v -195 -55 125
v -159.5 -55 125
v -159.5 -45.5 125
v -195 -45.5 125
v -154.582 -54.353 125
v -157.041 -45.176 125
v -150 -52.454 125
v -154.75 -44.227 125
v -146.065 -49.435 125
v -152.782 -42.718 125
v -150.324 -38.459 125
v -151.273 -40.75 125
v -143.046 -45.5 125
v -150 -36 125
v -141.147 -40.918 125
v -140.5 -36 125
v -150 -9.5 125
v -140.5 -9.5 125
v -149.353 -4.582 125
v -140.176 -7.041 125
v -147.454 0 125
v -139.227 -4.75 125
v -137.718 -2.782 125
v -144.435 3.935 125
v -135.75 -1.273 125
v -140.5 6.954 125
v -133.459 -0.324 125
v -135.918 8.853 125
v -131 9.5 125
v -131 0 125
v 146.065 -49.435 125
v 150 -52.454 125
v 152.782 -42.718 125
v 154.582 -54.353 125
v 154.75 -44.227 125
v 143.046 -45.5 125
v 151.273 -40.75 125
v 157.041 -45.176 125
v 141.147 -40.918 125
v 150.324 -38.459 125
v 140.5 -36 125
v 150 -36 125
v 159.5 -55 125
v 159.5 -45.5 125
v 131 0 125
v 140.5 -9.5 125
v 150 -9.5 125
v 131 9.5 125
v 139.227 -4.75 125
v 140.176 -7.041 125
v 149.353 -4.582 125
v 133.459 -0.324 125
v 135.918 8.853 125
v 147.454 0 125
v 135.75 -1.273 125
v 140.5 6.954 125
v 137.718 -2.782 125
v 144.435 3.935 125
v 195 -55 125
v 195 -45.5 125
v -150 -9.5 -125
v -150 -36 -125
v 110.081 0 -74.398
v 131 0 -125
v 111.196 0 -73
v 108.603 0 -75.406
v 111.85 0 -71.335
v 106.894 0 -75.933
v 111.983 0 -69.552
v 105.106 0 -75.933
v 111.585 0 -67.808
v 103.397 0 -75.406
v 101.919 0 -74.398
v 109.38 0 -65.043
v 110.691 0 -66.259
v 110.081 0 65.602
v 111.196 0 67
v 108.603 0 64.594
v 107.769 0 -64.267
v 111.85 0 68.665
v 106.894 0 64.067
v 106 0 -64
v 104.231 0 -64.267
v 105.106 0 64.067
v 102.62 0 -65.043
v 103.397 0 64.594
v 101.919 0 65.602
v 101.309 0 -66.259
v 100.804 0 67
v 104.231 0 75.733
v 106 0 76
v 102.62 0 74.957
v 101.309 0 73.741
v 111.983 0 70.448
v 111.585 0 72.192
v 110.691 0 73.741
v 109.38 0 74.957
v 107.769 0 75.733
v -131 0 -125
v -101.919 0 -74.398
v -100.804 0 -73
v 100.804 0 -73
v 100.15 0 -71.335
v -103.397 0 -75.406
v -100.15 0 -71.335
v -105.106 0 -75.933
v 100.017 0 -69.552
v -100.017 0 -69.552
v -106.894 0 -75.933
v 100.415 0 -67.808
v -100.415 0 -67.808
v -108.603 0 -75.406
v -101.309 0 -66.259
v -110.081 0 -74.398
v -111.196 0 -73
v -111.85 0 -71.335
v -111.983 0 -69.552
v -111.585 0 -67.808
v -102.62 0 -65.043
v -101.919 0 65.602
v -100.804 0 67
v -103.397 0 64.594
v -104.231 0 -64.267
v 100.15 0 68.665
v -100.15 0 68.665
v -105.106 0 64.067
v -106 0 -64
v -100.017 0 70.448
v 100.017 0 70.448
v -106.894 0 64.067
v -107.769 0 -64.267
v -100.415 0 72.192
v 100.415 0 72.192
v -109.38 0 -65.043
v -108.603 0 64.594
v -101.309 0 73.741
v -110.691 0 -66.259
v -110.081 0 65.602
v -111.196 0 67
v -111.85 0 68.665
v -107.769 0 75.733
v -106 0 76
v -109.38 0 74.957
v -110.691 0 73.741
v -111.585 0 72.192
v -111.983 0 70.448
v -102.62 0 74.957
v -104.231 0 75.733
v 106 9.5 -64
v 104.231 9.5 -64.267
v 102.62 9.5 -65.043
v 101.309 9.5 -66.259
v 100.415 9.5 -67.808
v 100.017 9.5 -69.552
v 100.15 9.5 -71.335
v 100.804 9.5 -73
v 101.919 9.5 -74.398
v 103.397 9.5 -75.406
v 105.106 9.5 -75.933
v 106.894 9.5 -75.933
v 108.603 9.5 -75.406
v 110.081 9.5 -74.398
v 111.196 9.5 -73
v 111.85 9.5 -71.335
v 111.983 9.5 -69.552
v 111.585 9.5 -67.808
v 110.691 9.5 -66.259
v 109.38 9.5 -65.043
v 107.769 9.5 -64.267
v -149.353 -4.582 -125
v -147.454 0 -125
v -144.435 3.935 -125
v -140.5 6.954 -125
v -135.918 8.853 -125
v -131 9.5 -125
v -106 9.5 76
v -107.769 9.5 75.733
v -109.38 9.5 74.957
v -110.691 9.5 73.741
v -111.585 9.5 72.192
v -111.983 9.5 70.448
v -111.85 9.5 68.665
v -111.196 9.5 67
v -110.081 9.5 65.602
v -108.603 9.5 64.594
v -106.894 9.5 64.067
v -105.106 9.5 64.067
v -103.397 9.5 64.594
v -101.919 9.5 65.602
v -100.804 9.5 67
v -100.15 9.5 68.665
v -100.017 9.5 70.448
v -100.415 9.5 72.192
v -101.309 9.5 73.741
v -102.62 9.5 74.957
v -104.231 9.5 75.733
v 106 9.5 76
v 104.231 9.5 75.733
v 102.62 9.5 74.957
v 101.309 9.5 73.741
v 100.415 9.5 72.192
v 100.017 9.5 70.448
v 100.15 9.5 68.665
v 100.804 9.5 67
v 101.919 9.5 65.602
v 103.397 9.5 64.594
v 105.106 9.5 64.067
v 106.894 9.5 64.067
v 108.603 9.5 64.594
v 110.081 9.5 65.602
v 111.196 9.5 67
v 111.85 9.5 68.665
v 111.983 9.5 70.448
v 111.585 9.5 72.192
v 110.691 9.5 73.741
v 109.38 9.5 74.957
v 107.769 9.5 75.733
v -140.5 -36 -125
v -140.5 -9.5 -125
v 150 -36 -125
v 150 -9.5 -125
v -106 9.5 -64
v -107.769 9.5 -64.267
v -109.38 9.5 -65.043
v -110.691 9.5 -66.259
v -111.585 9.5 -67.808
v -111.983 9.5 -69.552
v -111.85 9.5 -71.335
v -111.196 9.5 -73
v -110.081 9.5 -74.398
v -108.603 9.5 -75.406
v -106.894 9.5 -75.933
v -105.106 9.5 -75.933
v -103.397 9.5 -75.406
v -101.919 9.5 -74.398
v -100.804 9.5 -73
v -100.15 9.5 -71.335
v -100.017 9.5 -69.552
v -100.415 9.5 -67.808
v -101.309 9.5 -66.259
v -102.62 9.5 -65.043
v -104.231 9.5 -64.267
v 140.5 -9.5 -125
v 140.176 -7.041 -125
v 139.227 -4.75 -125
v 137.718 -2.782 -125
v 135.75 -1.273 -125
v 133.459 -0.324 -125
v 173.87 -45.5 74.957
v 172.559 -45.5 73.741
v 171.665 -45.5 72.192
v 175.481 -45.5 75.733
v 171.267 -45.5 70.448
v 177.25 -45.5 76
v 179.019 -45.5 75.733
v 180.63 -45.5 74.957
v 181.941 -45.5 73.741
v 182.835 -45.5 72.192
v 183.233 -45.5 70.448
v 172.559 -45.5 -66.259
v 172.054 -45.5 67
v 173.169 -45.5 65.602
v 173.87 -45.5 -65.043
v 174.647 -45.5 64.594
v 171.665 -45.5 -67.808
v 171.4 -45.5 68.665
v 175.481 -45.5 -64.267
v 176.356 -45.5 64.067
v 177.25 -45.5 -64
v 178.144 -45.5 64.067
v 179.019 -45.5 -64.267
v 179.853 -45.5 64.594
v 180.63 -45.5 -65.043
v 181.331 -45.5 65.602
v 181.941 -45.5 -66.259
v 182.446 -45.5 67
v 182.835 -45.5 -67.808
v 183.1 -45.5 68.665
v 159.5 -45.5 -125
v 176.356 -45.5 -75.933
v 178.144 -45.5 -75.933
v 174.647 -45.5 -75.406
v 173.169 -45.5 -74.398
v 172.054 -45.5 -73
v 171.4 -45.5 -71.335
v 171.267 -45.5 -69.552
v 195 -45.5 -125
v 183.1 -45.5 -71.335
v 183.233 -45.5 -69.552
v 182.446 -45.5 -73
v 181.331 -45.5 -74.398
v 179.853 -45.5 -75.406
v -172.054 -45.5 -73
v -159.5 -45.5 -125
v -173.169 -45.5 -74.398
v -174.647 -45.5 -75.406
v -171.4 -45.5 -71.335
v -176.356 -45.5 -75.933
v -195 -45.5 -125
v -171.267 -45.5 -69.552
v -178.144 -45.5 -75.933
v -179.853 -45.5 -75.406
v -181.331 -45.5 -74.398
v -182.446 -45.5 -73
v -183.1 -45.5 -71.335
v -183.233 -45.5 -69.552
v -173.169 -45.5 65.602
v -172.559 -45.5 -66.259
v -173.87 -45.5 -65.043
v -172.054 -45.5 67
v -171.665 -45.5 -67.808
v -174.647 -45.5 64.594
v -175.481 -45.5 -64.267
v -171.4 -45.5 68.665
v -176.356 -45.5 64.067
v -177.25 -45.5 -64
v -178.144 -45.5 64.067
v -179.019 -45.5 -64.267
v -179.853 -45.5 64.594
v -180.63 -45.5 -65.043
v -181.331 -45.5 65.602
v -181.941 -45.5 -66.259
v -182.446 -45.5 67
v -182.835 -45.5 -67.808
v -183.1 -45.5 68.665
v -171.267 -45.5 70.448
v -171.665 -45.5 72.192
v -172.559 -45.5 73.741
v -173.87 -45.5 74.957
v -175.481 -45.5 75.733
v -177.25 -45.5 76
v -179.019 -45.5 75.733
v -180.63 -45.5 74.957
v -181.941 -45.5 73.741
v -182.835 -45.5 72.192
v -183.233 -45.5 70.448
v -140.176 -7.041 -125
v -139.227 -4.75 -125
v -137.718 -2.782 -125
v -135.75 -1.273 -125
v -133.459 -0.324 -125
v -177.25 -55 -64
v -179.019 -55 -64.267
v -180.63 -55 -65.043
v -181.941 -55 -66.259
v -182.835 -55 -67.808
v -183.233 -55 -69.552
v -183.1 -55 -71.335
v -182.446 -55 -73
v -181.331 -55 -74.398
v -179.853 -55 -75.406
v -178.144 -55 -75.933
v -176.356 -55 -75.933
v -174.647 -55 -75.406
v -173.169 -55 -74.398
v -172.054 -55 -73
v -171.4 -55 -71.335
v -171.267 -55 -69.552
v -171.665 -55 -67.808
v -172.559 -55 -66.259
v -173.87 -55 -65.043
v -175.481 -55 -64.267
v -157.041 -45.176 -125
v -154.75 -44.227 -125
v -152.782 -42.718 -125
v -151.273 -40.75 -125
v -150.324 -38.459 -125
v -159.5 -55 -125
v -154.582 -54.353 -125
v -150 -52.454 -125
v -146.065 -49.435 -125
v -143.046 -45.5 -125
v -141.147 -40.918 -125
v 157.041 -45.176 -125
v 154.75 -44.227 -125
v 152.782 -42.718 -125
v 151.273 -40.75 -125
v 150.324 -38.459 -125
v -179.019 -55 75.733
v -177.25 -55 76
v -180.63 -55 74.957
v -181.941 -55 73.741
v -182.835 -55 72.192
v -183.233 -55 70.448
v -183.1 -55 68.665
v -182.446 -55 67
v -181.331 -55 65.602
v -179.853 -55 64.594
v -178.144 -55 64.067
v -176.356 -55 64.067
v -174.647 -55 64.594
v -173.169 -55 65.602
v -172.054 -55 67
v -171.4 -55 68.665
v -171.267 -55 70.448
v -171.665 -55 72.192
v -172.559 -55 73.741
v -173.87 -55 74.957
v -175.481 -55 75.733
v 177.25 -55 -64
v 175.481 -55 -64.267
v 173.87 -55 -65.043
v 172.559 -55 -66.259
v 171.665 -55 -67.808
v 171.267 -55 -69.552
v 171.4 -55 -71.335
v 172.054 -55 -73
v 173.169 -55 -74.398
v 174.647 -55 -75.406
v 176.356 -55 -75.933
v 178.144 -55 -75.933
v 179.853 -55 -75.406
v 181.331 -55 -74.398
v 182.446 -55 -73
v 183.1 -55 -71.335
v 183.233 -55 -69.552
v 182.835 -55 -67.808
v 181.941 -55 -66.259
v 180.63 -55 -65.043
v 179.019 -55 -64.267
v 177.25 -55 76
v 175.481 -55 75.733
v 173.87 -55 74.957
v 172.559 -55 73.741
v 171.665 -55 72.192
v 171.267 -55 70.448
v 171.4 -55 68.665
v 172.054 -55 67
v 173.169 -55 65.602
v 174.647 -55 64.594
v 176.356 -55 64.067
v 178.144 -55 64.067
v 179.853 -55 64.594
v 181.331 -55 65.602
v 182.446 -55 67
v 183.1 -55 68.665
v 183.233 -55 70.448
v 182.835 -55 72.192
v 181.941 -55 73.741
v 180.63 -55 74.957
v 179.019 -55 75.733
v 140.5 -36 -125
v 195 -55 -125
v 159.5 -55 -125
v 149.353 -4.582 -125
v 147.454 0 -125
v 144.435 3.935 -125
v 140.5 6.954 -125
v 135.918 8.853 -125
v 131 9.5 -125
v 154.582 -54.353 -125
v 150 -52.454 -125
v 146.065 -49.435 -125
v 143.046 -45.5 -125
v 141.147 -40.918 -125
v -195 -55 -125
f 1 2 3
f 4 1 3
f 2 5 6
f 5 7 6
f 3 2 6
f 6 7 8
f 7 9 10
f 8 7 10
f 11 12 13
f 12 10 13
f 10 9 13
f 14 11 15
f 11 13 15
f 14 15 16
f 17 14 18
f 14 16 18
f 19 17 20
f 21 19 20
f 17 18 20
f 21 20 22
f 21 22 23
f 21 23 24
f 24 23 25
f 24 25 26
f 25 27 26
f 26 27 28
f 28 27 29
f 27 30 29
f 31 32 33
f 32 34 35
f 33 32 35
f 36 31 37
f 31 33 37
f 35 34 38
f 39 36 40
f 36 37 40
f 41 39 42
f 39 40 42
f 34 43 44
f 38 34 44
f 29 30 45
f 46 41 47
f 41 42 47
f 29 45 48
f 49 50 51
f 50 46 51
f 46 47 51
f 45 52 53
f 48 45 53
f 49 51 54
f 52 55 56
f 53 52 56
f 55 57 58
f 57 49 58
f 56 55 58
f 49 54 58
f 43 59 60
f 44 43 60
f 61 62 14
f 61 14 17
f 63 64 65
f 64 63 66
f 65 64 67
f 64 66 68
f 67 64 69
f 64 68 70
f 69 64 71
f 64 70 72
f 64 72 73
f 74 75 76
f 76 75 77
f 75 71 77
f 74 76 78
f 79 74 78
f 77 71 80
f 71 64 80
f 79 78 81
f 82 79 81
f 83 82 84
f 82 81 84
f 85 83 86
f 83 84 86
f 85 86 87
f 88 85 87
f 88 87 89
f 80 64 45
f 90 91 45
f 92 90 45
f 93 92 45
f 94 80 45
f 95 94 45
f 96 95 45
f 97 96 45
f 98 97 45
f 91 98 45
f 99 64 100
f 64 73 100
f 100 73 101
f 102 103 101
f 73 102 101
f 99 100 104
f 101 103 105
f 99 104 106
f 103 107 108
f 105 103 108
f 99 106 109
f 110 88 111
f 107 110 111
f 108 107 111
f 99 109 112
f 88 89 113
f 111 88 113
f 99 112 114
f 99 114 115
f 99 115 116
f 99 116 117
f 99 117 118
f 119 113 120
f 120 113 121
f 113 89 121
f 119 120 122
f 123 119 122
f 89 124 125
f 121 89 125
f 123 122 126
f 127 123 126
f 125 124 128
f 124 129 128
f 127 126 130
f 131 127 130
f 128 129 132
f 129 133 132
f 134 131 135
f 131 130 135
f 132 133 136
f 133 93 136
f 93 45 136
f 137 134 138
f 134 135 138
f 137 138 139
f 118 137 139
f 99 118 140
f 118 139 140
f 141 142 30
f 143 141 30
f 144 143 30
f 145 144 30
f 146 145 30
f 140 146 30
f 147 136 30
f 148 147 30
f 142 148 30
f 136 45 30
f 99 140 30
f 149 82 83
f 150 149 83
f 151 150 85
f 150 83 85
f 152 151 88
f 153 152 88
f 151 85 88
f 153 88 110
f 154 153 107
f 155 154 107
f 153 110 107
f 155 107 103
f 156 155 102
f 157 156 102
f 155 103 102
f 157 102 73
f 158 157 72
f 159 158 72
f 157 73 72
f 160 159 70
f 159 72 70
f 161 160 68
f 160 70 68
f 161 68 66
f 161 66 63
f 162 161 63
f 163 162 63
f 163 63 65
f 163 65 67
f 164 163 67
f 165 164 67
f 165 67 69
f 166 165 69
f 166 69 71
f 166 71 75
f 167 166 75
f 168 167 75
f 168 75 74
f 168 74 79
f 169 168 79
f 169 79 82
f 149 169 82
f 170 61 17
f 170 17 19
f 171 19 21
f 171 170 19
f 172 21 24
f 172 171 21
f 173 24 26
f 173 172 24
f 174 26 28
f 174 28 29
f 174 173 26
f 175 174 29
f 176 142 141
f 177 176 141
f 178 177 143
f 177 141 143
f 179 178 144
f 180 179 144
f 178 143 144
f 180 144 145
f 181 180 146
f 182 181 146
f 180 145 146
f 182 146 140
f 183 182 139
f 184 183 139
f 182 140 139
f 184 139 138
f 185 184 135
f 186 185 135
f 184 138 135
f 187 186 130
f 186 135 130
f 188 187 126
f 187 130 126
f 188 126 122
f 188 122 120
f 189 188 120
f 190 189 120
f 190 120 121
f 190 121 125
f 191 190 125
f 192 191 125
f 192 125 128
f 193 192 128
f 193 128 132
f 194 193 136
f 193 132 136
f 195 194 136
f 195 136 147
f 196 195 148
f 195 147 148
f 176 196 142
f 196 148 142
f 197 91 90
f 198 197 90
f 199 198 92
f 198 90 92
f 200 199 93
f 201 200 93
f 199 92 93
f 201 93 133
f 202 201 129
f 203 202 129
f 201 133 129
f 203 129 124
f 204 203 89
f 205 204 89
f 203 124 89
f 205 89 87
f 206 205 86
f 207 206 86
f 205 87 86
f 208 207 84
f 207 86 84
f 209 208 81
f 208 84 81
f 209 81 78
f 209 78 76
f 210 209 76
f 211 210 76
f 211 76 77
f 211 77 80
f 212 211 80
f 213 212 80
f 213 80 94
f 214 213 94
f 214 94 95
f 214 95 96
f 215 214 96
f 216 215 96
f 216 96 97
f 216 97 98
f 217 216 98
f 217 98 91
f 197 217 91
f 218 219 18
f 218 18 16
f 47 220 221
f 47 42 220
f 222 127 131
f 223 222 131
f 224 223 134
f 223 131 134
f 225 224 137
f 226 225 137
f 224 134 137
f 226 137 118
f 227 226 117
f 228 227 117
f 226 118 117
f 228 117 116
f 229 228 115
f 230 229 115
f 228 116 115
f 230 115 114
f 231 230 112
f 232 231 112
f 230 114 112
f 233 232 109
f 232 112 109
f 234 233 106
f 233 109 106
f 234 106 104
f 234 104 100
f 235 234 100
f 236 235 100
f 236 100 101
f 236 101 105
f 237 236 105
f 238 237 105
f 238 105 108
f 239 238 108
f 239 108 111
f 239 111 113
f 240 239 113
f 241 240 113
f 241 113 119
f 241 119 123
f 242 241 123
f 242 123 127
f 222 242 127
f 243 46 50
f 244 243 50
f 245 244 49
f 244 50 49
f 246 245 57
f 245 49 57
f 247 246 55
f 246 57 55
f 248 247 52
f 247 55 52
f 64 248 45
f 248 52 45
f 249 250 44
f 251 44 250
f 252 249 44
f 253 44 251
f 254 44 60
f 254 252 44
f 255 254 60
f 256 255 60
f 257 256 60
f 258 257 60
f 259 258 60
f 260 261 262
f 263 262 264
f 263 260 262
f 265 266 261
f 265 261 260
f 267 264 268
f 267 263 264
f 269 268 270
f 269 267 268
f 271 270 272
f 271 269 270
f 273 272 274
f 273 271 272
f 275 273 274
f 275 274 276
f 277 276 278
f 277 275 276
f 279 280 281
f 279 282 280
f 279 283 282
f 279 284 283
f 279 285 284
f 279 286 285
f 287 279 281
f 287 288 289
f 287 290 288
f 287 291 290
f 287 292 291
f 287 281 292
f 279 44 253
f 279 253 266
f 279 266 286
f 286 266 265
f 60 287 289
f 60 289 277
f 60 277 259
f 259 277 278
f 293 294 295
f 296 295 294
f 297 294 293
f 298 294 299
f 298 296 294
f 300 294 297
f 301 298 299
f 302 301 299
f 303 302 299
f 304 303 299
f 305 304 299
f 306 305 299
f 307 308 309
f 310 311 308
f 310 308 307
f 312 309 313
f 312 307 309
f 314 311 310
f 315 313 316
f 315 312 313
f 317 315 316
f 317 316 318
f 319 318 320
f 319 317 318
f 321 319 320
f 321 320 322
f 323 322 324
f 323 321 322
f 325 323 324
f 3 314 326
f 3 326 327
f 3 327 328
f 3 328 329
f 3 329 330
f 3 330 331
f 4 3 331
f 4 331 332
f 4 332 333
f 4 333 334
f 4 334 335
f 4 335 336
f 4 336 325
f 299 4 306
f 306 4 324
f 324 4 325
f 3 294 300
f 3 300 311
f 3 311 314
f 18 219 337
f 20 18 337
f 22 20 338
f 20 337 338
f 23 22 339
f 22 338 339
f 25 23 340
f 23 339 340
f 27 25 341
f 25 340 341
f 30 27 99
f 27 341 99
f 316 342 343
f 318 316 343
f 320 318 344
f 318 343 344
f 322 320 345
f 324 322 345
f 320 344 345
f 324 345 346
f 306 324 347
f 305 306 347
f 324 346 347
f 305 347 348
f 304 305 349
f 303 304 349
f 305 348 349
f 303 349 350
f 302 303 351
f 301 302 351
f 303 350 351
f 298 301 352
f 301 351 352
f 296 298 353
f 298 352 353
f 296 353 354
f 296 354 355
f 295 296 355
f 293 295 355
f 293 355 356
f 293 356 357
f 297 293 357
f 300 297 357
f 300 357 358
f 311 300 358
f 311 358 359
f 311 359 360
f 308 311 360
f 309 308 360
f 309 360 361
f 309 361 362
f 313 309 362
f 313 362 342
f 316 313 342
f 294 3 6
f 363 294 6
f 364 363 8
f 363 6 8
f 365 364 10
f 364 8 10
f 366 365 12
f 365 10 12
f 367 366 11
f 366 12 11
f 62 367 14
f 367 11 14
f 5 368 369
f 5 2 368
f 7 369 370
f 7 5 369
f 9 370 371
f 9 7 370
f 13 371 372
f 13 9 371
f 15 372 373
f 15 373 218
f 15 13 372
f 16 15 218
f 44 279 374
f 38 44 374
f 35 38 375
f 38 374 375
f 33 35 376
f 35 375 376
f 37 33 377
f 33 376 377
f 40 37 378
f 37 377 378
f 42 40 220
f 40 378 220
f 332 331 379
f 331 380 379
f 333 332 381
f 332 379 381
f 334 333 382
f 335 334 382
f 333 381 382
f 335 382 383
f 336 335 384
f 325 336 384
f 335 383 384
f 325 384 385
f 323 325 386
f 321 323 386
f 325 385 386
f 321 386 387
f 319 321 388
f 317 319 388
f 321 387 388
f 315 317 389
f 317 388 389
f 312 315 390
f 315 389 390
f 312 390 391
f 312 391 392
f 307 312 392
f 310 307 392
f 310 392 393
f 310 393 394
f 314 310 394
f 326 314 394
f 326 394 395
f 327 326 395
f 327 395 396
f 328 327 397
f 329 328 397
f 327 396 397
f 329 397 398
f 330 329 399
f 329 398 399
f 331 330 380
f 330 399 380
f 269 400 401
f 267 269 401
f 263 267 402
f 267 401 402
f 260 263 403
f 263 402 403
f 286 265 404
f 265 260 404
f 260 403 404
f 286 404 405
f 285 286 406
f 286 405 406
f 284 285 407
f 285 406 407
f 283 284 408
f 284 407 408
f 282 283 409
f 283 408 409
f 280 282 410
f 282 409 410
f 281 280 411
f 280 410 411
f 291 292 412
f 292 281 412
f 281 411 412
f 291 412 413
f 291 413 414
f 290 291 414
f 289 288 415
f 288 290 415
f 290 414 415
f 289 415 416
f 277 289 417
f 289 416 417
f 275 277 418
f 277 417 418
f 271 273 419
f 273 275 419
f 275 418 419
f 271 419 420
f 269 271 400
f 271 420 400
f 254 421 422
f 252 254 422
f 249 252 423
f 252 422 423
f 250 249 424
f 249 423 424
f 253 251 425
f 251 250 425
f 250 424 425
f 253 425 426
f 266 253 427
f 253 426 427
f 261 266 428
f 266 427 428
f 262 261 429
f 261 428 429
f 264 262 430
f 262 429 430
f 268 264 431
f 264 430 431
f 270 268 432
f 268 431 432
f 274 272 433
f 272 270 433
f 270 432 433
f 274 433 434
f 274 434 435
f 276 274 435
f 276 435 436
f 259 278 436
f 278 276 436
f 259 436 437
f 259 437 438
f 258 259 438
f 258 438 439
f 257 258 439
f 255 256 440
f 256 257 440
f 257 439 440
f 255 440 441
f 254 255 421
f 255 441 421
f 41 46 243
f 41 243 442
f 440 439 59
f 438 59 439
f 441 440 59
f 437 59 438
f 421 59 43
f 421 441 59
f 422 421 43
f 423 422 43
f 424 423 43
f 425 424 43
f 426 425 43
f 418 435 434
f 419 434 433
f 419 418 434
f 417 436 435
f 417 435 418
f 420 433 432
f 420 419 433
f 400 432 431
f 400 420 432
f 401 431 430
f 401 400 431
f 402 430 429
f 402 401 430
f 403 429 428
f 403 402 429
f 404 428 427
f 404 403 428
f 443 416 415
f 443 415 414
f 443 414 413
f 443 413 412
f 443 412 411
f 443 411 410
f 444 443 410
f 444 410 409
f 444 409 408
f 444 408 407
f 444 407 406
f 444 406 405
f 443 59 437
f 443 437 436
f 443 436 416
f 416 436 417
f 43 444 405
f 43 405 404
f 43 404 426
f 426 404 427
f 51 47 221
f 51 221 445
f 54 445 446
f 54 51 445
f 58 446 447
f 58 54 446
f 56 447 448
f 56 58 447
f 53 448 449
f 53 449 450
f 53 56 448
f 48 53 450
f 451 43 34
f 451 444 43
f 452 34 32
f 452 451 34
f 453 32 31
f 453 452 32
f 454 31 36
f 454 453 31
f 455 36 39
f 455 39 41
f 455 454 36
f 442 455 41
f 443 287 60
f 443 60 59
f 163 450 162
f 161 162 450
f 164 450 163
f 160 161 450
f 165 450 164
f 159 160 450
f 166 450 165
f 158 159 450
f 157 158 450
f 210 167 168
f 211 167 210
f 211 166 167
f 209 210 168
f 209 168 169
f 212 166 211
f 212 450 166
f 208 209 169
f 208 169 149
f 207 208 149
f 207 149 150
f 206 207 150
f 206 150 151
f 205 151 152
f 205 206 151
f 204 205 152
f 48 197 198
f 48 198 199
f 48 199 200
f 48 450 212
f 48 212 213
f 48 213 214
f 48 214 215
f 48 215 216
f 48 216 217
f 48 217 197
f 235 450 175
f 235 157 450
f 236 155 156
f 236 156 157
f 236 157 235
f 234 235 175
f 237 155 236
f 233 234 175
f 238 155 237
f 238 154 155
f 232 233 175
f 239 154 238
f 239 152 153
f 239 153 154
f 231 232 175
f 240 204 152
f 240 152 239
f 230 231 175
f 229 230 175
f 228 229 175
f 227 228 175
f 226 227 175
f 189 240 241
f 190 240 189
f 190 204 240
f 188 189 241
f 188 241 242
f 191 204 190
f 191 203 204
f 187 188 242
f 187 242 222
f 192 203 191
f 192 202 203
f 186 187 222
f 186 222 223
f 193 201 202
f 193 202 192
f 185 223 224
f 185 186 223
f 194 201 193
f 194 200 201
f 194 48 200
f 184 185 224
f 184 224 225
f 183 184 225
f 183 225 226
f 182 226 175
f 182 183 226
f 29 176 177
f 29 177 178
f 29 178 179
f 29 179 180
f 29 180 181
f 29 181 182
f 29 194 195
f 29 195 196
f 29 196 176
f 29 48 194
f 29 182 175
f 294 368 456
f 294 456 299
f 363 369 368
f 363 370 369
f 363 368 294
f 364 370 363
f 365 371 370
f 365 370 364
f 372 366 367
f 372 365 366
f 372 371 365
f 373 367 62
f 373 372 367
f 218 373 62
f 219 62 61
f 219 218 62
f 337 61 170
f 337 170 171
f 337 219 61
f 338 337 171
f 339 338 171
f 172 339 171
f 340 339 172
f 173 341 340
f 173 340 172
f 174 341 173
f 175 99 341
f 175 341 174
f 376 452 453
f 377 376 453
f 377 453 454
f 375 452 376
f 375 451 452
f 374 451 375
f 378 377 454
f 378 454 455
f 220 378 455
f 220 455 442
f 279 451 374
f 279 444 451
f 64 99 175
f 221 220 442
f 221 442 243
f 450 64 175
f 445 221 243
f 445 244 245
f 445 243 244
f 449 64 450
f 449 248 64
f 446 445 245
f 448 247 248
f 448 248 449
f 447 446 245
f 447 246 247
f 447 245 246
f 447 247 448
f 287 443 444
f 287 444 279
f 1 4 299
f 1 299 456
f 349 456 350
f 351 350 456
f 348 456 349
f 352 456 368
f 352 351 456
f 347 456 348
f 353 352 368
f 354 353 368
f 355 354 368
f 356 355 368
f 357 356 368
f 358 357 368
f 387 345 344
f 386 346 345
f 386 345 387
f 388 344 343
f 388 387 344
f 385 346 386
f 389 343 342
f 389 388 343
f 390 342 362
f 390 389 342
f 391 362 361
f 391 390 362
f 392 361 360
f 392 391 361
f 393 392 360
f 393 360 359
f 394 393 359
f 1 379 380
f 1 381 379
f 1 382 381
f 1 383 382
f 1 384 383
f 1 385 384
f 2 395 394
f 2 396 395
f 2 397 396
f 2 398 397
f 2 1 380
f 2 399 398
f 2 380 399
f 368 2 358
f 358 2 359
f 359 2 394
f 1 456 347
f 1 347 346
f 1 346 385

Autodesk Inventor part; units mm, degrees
ref_plane "YZ Plane" through (0, 0, 0) normal (1, 0, 0) x (0, 1, 0)
ref_plane "XZ Plane" through (0, 0, 0) normal (0, 1, 0) x (-1, 0, 0)
ref_plane "XY Plane" through (0, 0, 0) normal (0, 0, 1) x (1, 0, 0)
sketch "Sketch1" plane through (0, 0, 0) normal (0, 1, 0) x (-1, 0, 0)
  line L0 (150, 125) -> (-150, 125)
  line L1 (-150, 125) -> (-150, -125)
  line L2 (-150, -125) -> (150, -125)
  line L3 (150, -125) -> (150, 125)
  point P0 (0, 0)
  dimension "d0" = 300
  dimension "d1" = 250
  dimension "d2" = 125
  dimension "d29" = 150
extrude "Plate1" add sketch "Sketch1" along normal blind 9.5
sketch "Sketch4" plane through (0, 9.5, 0) normal (0, 1, 0) x (1, 0, 0)
  line L0 (-106, -70) -> (106, -70)
  line L1 (106, -70) -> (106, 70)
  line L2 (106, 70) -> (-106, 70)
  line L3 (-106, 70) -> (-106, -70)
  line L4 (-150, -125) -> (-150, 125) projected
  point P0 (0, 0)
  point P1 (-130, -106)
  point P2 (-130, 106)
  dimension "d24" = 140
  dimension "d25" = 212
  dimension "d27" = 70
  dimension "d28" = 106
hole "Hole1" at (-106, 9.5, 70) at (-106, 9.5, -70) at (106, 9.5, 70) at (106, 9.5, -70) direction (0, -1, 0) diameter 12 depth 9.5
sketch "Sketch8" plane through (-140.5, 9.5, 125) normal (-1, 0, 0) x (0, 1, 0)
  line L0 (0, -250) -> (0, 0)
  line L1 (0, 0) -> (-64.5, 0)
  line L2 (-64.5, 0) -> (-64.5, -250)
  line L3 (-64.5, -250) -> (0, -250)
edge flange "Flange5" height 64.5 angle 90 thickness 9.5 bend radius 9.5 thickness toward (-1, 0, 0) relief tear relief width 9.5 relief depth 4.75 edges at (-150, 9.5, 0) wall of the first edge with corners at (-140.5, 9.5, -125) (-140.5, 9.5, 125) (-140.5, -55, 125) (-140.5, -55, -125)
bend "Bend5"
corner "Corner5"
sketch "Sketch9" plane through (140.5, 9.5, -125) normal (1, 0, 0) x (0, -1, 0)
  line L0 (0, 250) -> (0, 0)
  line L1 (0, 0) -> (64.5, 0)
  line L2 (64.5, 0) -> (64.5, 250)
  line L3 (64.5, 250) -> (0, 250)
edge flange "Flange6" height 64.5 angle 90 thickness 9.5 bend radius 9.5 thickness toward (1, 0, 0) relief tear relief width 9.5 relief depth 4.75 edges at (150, 9.5, 0) wall of the first edge with corners at (140.5, 9.5, 125) (140.5, 9.5, -125) (140.5, -55, -125) (140.5, -55, 125)
bend "Bend6"
corner "Corner6"
sketch "Sketch10" plane through (-140.5, -45.5, -125) normal (0, -1, 0) x (-1, 0, 0)
  line L0 (0, 250) -> (0, 0)
  line L1 (0, 0) -> (54.5, 0)
  line L2 (54.5, 0) -> (54.5, 250)
  line L3 (54.5, 250) -> (0, 250)
edge flange "Flange7" height 45 angle 90 thickness 9.5 bend radius 9.5 thickness toward (0, -1, 0) relief tear relief width 9.5 relief depth 4.75 edges at (-140.5, -55, 0) wall of the first edge with corners at (-140.5, -45.5, 125) (-140.5, -45.5, -125) (-195, -45.5, -125) (-195, -45.5, 125)
bend "Bend7"
corner "Corner7"
sketch "Sketch11" plane through (140.5, -45.5, 125) normal (0, -1, 0) x (-1, 0, 0)
  line L0 (0, -250) -> (0, 0)
  line L1 (0, 0) -> (-54.5, 0)
  line L2 (-54.5, 0) -> (-54.5, -250)
  line L3 (-54.5, -250) -> (0, -250)
edge flange "Flange8" height 45 angle 90 thickness 9.5 bend radius 9.5 thickness toward (0, -1, 0) relief tear relief width 9.5 relief depth 4.75 edges at (140.5, -55, 0) wall of the first edge with corners at (140.5, -45.5, -125) (140.5, -45.5, 125) (195, -45.5, 125) (195, -45.5, -125)
bend "Bend8"
corner "Corner8"
sketch "Sketch12" plane through (-195, -45.5, 125) normal (0, 1, 0) x (1, 0, 0)
  line L0 (35.5, 250) -> (0, 250) projected
  line L1 (17.75, 250) -> (17.75, 0)
  line L2 (35.5, 0) -> (0, 0) projected
  line L3 (0, 0) -> (0, 250) projected
  line L4 (0, 195) -> (35.5, 195)
  line L5 (0, 55) -> (35.5, 55)
  line L6 (35.5, 250) -> (35.5, 0) projected
  point P0 (195, 125)
  point P1 (17.75, 195)
  point P2 (17.75, 55)
  dimension "d110" = 55
  dimension "d111" = 55
hole "Hole3" at (-177.25, -45.5, -70) at (-177.25, -45.5, 70) direction (0, -1, 0) diameter 12 depth 9.5
mirror "Mirror2" about plane through (0, 0, 0) normal (1, 0, 0) of "Hole3"
equation "\"d28\" = 0.5 * d25"
equation "\"d35\" = Thickness"
equation "\"d117\" = Thickness"
equation "\"d3\" = Thickness"
equation "\"d69\" = BendReliefWidth"
equation "\"d70\" = BendReliefDepth"
equation "\"d71\" = MinimumRemnant"
equation "\"d72\" = TransitionRadius"
equation "\"d75\" = BendRadius"
equation "\"d76\" = CornerReliefSize"
equation "\"d77\" = GapSize"
equation "\"d78\" = JacobiRadiusSize"
equation "\"d79\" = BendReliefWidth"
equation "\"d80\" = BendReliefDepth"
equation "\"d81\" = MinimumRemnant"
equation "\"d82\" = TransitionRadius"
equation "\"d85\" = BendRadius"
equation "\"d86\" = CornerReliefSize"
equation "\"d87\" = GapSize"
equation "\"d88\" = JacobiRadiusSize"
equation "\"d89\" = BendReliefWidth"
equation "\"d90\" = BendReliefDepth"
equation "\"d91\" = MinimumRemnant"
equation "\"d92\" = TransitionRadius"
equation "\"d95\" = BendRadius"
equation "\"d96\" = CornerReliefSize"
equation "\"d97\" = GapSize"
equation "\"d98\" = JacobiRadiusSize"
equation "\"d99\" = BendReliefWidth"
equation "\"d100\" = BendReliefDepth"
equation "\"d101\" = MinimumRemnant"
equation "\"d102\" = TransitionRadius"
equation "\"d105\" = BendRadius"
equation "\"d106\" = CornerReliefSize"
equation "\"d107\" = GapSize"
equation "\"d108\" = JacobiRadiusSize"
equation "\"d2\" = 0.5 * d1"
equation "\"d29\" = 0.5 * d0"
equation "\"BendRadius\" = Thickness"
equation "\"BendReliefWidth\" = Thickness"
equation "\"BendReliefDepth\" = 0.5 * Thickness"
equation "\"CornerReliefSize\" = 4 * Thickness"
equation "\"MinimumRemnant\" = 2 * Thickness"
equation "\"TransitionRadius\" = BendRadius"
equation "\"JacobiRadiusSize\" = BendRadius"
equation "\"GapSize\" = Thickness"
equation "\"Thickness\" = 9.5"
properties part number "BaseMotor" material "Steel ASTM A36"
